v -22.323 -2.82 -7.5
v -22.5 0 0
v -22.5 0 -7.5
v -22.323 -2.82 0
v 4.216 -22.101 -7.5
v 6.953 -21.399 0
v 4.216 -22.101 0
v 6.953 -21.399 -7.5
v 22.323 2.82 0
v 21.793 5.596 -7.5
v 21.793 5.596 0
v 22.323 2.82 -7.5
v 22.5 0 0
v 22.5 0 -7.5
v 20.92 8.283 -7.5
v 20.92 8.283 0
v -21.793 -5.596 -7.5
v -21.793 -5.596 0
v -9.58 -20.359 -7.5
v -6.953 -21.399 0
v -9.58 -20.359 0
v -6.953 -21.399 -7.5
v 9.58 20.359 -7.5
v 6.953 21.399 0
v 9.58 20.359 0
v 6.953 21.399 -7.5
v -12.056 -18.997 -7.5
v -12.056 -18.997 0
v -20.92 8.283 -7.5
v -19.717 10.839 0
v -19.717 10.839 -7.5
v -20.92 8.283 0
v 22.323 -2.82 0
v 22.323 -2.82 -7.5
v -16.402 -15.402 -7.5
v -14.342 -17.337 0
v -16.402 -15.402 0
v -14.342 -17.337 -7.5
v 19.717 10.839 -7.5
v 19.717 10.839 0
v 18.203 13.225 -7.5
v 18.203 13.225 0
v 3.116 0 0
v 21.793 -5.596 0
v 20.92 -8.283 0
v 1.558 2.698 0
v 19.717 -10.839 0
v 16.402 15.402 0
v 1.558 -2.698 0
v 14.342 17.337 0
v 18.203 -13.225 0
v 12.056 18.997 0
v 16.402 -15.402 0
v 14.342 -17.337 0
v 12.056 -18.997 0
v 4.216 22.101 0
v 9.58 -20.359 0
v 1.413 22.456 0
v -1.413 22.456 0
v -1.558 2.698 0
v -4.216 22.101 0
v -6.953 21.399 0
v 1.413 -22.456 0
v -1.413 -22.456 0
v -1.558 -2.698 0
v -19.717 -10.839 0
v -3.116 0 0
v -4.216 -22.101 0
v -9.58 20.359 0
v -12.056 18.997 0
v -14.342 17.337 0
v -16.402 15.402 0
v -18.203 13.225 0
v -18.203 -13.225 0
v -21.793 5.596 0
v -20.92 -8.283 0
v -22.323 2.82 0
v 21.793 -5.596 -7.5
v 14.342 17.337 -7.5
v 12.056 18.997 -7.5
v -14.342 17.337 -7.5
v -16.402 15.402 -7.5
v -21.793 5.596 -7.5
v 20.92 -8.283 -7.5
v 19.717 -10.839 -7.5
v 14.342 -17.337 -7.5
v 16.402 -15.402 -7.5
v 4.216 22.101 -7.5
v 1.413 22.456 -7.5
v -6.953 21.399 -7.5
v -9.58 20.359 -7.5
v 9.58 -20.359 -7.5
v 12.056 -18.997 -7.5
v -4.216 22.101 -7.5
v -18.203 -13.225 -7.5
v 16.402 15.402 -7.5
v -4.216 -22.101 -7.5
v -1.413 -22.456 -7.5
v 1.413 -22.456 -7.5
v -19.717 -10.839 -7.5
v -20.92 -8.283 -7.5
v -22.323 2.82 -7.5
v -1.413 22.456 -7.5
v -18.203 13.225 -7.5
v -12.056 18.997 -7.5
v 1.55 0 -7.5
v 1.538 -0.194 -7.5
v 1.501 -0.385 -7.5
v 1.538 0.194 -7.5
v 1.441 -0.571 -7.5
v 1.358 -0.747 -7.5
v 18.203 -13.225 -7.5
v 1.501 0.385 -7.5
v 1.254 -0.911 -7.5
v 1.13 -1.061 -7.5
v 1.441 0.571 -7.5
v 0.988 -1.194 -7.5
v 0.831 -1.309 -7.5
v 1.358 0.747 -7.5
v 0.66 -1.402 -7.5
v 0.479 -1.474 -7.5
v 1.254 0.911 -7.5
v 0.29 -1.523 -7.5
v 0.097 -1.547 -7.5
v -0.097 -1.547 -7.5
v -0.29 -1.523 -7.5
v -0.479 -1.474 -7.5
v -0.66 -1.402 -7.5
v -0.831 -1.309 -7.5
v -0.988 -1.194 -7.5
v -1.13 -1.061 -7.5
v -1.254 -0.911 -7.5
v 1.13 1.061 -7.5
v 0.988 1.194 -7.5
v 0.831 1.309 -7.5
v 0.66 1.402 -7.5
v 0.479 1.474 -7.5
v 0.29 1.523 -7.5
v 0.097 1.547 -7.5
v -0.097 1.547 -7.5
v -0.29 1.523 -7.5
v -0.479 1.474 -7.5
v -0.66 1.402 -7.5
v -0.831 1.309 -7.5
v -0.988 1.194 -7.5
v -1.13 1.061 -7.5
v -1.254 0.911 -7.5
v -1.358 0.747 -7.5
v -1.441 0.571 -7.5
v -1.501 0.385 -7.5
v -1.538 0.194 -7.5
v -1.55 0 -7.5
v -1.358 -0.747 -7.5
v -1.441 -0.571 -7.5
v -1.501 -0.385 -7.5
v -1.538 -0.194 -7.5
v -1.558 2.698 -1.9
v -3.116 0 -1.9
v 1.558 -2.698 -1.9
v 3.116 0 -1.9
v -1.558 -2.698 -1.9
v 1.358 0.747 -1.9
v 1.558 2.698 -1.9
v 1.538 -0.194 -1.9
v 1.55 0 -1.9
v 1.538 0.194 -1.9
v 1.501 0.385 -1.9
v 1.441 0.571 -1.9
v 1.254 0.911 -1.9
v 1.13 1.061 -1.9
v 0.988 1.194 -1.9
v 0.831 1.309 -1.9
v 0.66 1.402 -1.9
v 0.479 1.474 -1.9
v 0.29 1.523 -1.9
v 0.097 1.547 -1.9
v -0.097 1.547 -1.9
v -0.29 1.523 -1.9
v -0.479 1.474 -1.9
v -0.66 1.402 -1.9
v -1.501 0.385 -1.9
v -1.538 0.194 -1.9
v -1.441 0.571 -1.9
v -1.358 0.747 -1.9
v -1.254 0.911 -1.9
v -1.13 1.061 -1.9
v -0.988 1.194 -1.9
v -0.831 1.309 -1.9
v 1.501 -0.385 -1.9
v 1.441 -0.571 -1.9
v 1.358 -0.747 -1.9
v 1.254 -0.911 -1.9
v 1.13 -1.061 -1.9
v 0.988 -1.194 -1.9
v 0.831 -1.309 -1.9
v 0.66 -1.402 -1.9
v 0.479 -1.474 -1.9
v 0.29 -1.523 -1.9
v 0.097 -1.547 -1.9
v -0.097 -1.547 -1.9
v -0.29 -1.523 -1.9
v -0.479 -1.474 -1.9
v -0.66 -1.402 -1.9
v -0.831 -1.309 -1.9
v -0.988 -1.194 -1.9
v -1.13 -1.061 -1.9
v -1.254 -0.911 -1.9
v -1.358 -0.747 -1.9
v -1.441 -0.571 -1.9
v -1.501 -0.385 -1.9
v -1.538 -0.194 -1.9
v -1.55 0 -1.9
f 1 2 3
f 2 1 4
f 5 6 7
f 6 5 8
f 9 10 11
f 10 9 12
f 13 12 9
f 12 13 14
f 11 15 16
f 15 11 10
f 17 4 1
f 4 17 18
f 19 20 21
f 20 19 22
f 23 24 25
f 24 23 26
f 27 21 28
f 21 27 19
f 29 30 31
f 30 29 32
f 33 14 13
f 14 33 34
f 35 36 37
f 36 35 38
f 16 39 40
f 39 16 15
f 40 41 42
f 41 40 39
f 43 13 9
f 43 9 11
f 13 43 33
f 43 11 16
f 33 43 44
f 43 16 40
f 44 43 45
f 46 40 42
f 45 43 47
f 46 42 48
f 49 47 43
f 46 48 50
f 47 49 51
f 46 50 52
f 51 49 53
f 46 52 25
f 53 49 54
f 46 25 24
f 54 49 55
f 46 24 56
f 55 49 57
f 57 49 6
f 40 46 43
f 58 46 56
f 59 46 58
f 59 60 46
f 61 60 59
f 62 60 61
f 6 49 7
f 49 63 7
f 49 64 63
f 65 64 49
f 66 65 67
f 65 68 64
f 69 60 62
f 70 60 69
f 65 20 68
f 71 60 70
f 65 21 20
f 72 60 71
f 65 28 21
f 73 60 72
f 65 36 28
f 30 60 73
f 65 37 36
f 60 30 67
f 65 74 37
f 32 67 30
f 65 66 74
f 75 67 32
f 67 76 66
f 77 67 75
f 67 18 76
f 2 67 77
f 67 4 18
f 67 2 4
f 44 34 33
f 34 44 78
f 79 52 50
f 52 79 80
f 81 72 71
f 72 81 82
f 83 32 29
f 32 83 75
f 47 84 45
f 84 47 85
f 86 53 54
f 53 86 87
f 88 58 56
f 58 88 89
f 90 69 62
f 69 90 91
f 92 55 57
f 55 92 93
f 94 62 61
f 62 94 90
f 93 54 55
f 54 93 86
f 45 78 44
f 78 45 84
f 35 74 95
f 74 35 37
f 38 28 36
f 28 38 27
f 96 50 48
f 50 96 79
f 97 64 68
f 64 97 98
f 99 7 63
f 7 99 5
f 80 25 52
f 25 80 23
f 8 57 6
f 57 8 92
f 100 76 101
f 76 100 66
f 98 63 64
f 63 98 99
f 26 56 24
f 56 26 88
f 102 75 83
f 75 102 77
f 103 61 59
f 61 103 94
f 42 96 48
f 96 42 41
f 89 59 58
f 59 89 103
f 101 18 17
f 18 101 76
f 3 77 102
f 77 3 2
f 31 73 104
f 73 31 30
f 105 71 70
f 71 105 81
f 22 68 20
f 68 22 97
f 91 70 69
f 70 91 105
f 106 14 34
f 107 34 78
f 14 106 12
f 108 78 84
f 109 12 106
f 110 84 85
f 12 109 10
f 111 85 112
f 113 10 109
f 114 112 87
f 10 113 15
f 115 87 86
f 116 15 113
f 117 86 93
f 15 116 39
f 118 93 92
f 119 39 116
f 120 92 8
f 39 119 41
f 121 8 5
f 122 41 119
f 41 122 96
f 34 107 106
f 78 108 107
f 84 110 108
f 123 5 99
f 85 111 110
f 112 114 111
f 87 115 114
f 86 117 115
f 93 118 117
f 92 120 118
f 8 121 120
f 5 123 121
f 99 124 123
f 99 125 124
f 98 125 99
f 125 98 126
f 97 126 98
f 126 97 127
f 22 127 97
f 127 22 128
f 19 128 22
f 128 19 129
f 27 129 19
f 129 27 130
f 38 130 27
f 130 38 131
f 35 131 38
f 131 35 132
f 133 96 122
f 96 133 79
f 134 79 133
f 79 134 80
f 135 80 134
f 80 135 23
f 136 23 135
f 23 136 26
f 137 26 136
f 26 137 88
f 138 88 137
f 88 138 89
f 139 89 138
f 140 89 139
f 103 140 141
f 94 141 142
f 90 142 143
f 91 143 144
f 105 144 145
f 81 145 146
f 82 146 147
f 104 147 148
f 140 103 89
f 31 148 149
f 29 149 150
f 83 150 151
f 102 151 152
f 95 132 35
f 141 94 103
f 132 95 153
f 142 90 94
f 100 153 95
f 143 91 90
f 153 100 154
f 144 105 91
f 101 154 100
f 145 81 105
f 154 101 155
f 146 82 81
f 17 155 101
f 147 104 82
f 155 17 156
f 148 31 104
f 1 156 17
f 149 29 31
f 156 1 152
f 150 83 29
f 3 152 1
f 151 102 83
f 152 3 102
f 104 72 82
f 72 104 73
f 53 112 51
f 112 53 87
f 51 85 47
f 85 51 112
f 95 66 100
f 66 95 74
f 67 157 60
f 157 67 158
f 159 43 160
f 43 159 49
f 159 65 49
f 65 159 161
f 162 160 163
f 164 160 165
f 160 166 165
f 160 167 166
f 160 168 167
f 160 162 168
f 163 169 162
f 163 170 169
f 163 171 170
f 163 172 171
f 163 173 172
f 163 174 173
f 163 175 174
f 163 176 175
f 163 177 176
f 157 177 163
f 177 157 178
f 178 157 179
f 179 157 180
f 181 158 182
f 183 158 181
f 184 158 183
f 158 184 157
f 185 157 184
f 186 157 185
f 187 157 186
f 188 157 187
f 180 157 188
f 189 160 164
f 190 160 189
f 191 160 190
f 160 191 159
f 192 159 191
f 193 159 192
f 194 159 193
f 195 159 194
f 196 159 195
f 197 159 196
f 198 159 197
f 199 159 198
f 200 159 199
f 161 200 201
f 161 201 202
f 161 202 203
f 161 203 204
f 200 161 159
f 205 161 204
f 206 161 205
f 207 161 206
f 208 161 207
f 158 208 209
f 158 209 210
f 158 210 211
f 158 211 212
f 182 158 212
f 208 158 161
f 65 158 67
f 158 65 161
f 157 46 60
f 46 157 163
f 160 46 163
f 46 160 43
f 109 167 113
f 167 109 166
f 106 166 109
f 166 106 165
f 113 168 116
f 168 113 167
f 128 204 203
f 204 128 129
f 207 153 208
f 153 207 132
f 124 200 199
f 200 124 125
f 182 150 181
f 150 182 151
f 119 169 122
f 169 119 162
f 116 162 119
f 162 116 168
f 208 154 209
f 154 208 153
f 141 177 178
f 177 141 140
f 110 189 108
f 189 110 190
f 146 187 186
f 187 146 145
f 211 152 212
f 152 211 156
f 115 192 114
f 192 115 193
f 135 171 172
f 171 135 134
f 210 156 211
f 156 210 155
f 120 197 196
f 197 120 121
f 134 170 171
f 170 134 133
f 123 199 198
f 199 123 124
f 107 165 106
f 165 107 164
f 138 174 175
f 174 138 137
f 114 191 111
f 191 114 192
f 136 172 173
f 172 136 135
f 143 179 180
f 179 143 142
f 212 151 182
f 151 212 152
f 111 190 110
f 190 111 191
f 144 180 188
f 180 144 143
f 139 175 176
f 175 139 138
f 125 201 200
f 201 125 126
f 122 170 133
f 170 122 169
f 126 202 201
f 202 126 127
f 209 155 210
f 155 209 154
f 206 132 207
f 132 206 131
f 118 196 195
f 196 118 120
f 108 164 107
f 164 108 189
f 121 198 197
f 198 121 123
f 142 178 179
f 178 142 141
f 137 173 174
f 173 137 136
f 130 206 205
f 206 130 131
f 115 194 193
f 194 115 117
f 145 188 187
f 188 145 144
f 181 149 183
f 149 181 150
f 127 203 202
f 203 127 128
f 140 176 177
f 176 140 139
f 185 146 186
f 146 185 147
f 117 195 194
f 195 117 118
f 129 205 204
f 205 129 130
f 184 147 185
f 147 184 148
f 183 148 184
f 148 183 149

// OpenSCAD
$fn = 50;


difference() {
	union() {
		translate(v = [0, 0, -7.5000000000]) {
			cylinder(h = 7.5000000000, r = 22.5000000000);
		}
		translate(v = [0, 0, -6.0000000000]) {
			cylinder(h = 6, r = 2.8750000000);
		}
	}
	union() {
		translate(v = [0, 0, 0]) {
			rotate(a = [0, 0, 0]) {
				difference() {
					union() {
						translate(v = [0, 0, -1.9000000000]) {
							linear_extrude(height = 1.9000000000) {
								polygon(points = [[3.1158000000, 0.0000000000], [1.5579000000, 2.6983619531], [-1.5579000000, 2.6983619531], [-3.1158000000, 0.0000000000], [-1.5579000000, -2.6983619531], [1.5579000000, -2.6983619531]]);
							}
						}
					}
					union();
				}
			}
		}
		#translate(v = [0, 0, -100.0000000000]) {
			cylinder(h = 200, r = 1.5500000000);
		}
	}
}
